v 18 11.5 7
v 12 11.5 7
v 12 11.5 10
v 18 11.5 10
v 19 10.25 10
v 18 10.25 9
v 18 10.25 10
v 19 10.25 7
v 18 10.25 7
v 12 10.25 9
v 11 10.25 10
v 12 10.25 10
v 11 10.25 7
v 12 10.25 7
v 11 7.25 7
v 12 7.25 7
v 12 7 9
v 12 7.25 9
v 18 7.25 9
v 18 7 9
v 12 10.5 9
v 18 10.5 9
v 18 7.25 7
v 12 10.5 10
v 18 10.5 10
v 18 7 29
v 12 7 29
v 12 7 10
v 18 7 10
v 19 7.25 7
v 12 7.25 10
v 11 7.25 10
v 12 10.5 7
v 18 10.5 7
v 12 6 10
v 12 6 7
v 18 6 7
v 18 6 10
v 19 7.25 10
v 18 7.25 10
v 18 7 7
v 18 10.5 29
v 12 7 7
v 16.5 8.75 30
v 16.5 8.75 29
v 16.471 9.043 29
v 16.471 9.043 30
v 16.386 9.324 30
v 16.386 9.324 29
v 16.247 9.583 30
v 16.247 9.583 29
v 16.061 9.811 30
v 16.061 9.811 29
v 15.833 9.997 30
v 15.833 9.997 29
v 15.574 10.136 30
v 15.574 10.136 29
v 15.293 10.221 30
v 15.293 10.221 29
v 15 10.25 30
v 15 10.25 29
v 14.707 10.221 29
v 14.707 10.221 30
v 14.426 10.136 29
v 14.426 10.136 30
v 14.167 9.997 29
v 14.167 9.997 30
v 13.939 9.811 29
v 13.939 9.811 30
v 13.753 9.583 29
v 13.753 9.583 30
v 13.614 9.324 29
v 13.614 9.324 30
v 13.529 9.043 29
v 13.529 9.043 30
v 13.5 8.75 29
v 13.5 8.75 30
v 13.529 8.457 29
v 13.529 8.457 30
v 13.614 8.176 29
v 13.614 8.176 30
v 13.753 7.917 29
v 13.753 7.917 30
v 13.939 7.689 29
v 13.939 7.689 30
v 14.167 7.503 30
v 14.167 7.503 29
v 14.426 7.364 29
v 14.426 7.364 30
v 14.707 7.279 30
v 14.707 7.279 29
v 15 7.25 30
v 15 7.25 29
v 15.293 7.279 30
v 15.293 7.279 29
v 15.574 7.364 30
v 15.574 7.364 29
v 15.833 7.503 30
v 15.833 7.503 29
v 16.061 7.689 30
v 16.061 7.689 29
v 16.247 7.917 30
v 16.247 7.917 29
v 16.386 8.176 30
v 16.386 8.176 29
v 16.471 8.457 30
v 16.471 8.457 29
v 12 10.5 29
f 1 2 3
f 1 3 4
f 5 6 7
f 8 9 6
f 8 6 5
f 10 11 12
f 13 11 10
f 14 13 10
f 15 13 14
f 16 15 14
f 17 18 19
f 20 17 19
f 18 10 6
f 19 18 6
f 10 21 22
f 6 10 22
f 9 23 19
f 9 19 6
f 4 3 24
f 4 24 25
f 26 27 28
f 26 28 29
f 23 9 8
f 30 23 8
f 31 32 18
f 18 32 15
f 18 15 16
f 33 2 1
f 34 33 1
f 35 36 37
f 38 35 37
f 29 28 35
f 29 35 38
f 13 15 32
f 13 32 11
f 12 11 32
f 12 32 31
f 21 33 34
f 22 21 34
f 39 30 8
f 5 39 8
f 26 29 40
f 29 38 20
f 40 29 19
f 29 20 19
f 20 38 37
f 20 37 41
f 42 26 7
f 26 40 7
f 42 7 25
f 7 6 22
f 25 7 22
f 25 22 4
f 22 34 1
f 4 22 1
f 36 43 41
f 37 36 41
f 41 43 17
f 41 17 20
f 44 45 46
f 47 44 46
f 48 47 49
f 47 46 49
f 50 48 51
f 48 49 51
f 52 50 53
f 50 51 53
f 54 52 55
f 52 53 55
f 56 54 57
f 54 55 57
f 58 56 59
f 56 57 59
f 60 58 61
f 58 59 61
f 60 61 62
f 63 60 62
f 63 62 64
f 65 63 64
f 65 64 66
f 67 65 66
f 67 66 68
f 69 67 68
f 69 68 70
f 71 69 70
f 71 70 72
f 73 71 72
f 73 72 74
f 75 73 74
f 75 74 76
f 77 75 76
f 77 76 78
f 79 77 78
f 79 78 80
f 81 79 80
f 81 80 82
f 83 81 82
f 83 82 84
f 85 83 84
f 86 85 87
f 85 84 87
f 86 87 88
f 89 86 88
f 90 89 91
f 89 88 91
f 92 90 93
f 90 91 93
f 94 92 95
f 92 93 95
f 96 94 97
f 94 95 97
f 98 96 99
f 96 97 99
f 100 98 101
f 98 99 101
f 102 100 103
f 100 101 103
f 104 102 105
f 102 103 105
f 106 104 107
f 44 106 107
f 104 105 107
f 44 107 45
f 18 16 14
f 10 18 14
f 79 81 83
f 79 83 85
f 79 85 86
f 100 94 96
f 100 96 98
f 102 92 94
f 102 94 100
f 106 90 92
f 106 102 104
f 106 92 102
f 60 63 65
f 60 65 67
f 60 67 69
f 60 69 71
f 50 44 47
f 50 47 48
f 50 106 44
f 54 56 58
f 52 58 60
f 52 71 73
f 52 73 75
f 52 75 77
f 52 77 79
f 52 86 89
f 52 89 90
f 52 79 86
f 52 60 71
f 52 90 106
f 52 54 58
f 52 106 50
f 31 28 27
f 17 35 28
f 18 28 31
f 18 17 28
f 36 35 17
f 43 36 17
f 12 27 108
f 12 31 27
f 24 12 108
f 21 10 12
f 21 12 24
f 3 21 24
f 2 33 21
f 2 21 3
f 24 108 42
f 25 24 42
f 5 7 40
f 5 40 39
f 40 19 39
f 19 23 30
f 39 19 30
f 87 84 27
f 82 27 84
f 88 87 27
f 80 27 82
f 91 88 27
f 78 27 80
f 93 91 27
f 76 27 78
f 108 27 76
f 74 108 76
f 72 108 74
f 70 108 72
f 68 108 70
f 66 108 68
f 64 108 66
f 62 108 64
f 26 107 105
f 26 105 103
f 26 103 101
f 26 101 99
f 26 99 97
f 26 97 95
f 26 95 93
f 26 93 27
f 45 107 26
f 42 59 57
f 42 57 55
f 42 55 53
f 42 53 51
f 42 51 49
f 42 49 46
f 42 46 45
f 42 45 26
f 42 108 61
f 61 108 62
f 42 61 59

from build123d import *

# Parameters (mm, degrees)
CYLINDER_R     = 1.5
CYLINDER_DEPTH = 10
BOX004_W       = 1
BOX004_H       = 3
BOX004_DEPTH   = 3
BOX005_W       = 1
BOX005_H       = 3
BOX005_DEPTH   = 3
BOX006_W       = 6
BOX006_H       = 1
BOX006_DEPTH   = 3
BOX007_W       = 6
BOX007_H       = 1
BOX007_DEPTH   = 3
BOX003_W       = 6
BOX003_H       = 3.5
BOX003_DEPTH   = 20


with BuildPart() as cylinder:
    # Cylinder → Cylinder (new body)
    with BuildSketch(Plane(origin=(15, 8.75, 20), x_dir=(1, 0, 0), z_dir=(0, 0, 1))):
        Circle(CYLINDER_R)
    extrude(amount=CYLINDER_DEPTH)


with BuildPart() as box004:
    # Box004 → Box004 (new body)
    with BuildSketch(Plane(origin=(11, 7.25, 7), x_dir=(1, 0, 0), z_dir=(0, 0, 1))):
        with Locations((0.5, 1.5)):
            Rectangle(BOX004_W, BOX004_H)
    extrude(amount=BOX004_DEPTH)


with BuildPart() as box005:
    # Box005 → Box005 (new body)
    with BuildSketch(Plane(origin=(18, 7.25, 7), x_dir=(1, 0, 0), z_dir=(0, 0, 1))):
        with Locations((0.5, 1.5)):
            Rectangle(BOX005_W, BOX005_H)
    extrude(amount=BOX005_DEPTH)


with BuildPart() as box006:
    # Box006 → Box006 (new body)
    with BuildSketch(Plane(origin=(12, 6, 7), x_dir=(1, 0, 0), z_dir=(0, 0, 1))):
        with Locations((3, 0.5)):
            Rectangle(BOX006_W, BOX006_H)
    extrude(amount=BOX006_DEPTH)


with BuildPart() as box007:
    # Box007 → Box007 (new body)
    with BuildSketch(Plane(origin=(12, 10.5, 7), x_dir=(1, 0, 0), z_dir=(0, 0, 1))):
        with Locations((3, 0.5)):
            Rectangle(BOX007_W, BOX007_H)
    extrude(amount=BOX007_DEPTH)


with BuildPart() as bt_ex1:
    # Box003 → Box003 (new body)
    with BuildSketch(Plane(origin=(12, 7, 9), x_dir=(1, 0, 0), z_dir=(0, 0, 1))):
        with Locations((3, 1.75)):
            Rectangle(BOX003_W, BOX003_H)
    extrude(amount=BOX003_DEPTH)

    # Fusion: union Box004, Box005, Box006, Box007
    add(box004.part)
    add(box005.part)
    add(box006.part)
    add(box007.part)

    # Fusion005: union Cylinder
    add(cylinder.part)


solid = bt_ex1.part
